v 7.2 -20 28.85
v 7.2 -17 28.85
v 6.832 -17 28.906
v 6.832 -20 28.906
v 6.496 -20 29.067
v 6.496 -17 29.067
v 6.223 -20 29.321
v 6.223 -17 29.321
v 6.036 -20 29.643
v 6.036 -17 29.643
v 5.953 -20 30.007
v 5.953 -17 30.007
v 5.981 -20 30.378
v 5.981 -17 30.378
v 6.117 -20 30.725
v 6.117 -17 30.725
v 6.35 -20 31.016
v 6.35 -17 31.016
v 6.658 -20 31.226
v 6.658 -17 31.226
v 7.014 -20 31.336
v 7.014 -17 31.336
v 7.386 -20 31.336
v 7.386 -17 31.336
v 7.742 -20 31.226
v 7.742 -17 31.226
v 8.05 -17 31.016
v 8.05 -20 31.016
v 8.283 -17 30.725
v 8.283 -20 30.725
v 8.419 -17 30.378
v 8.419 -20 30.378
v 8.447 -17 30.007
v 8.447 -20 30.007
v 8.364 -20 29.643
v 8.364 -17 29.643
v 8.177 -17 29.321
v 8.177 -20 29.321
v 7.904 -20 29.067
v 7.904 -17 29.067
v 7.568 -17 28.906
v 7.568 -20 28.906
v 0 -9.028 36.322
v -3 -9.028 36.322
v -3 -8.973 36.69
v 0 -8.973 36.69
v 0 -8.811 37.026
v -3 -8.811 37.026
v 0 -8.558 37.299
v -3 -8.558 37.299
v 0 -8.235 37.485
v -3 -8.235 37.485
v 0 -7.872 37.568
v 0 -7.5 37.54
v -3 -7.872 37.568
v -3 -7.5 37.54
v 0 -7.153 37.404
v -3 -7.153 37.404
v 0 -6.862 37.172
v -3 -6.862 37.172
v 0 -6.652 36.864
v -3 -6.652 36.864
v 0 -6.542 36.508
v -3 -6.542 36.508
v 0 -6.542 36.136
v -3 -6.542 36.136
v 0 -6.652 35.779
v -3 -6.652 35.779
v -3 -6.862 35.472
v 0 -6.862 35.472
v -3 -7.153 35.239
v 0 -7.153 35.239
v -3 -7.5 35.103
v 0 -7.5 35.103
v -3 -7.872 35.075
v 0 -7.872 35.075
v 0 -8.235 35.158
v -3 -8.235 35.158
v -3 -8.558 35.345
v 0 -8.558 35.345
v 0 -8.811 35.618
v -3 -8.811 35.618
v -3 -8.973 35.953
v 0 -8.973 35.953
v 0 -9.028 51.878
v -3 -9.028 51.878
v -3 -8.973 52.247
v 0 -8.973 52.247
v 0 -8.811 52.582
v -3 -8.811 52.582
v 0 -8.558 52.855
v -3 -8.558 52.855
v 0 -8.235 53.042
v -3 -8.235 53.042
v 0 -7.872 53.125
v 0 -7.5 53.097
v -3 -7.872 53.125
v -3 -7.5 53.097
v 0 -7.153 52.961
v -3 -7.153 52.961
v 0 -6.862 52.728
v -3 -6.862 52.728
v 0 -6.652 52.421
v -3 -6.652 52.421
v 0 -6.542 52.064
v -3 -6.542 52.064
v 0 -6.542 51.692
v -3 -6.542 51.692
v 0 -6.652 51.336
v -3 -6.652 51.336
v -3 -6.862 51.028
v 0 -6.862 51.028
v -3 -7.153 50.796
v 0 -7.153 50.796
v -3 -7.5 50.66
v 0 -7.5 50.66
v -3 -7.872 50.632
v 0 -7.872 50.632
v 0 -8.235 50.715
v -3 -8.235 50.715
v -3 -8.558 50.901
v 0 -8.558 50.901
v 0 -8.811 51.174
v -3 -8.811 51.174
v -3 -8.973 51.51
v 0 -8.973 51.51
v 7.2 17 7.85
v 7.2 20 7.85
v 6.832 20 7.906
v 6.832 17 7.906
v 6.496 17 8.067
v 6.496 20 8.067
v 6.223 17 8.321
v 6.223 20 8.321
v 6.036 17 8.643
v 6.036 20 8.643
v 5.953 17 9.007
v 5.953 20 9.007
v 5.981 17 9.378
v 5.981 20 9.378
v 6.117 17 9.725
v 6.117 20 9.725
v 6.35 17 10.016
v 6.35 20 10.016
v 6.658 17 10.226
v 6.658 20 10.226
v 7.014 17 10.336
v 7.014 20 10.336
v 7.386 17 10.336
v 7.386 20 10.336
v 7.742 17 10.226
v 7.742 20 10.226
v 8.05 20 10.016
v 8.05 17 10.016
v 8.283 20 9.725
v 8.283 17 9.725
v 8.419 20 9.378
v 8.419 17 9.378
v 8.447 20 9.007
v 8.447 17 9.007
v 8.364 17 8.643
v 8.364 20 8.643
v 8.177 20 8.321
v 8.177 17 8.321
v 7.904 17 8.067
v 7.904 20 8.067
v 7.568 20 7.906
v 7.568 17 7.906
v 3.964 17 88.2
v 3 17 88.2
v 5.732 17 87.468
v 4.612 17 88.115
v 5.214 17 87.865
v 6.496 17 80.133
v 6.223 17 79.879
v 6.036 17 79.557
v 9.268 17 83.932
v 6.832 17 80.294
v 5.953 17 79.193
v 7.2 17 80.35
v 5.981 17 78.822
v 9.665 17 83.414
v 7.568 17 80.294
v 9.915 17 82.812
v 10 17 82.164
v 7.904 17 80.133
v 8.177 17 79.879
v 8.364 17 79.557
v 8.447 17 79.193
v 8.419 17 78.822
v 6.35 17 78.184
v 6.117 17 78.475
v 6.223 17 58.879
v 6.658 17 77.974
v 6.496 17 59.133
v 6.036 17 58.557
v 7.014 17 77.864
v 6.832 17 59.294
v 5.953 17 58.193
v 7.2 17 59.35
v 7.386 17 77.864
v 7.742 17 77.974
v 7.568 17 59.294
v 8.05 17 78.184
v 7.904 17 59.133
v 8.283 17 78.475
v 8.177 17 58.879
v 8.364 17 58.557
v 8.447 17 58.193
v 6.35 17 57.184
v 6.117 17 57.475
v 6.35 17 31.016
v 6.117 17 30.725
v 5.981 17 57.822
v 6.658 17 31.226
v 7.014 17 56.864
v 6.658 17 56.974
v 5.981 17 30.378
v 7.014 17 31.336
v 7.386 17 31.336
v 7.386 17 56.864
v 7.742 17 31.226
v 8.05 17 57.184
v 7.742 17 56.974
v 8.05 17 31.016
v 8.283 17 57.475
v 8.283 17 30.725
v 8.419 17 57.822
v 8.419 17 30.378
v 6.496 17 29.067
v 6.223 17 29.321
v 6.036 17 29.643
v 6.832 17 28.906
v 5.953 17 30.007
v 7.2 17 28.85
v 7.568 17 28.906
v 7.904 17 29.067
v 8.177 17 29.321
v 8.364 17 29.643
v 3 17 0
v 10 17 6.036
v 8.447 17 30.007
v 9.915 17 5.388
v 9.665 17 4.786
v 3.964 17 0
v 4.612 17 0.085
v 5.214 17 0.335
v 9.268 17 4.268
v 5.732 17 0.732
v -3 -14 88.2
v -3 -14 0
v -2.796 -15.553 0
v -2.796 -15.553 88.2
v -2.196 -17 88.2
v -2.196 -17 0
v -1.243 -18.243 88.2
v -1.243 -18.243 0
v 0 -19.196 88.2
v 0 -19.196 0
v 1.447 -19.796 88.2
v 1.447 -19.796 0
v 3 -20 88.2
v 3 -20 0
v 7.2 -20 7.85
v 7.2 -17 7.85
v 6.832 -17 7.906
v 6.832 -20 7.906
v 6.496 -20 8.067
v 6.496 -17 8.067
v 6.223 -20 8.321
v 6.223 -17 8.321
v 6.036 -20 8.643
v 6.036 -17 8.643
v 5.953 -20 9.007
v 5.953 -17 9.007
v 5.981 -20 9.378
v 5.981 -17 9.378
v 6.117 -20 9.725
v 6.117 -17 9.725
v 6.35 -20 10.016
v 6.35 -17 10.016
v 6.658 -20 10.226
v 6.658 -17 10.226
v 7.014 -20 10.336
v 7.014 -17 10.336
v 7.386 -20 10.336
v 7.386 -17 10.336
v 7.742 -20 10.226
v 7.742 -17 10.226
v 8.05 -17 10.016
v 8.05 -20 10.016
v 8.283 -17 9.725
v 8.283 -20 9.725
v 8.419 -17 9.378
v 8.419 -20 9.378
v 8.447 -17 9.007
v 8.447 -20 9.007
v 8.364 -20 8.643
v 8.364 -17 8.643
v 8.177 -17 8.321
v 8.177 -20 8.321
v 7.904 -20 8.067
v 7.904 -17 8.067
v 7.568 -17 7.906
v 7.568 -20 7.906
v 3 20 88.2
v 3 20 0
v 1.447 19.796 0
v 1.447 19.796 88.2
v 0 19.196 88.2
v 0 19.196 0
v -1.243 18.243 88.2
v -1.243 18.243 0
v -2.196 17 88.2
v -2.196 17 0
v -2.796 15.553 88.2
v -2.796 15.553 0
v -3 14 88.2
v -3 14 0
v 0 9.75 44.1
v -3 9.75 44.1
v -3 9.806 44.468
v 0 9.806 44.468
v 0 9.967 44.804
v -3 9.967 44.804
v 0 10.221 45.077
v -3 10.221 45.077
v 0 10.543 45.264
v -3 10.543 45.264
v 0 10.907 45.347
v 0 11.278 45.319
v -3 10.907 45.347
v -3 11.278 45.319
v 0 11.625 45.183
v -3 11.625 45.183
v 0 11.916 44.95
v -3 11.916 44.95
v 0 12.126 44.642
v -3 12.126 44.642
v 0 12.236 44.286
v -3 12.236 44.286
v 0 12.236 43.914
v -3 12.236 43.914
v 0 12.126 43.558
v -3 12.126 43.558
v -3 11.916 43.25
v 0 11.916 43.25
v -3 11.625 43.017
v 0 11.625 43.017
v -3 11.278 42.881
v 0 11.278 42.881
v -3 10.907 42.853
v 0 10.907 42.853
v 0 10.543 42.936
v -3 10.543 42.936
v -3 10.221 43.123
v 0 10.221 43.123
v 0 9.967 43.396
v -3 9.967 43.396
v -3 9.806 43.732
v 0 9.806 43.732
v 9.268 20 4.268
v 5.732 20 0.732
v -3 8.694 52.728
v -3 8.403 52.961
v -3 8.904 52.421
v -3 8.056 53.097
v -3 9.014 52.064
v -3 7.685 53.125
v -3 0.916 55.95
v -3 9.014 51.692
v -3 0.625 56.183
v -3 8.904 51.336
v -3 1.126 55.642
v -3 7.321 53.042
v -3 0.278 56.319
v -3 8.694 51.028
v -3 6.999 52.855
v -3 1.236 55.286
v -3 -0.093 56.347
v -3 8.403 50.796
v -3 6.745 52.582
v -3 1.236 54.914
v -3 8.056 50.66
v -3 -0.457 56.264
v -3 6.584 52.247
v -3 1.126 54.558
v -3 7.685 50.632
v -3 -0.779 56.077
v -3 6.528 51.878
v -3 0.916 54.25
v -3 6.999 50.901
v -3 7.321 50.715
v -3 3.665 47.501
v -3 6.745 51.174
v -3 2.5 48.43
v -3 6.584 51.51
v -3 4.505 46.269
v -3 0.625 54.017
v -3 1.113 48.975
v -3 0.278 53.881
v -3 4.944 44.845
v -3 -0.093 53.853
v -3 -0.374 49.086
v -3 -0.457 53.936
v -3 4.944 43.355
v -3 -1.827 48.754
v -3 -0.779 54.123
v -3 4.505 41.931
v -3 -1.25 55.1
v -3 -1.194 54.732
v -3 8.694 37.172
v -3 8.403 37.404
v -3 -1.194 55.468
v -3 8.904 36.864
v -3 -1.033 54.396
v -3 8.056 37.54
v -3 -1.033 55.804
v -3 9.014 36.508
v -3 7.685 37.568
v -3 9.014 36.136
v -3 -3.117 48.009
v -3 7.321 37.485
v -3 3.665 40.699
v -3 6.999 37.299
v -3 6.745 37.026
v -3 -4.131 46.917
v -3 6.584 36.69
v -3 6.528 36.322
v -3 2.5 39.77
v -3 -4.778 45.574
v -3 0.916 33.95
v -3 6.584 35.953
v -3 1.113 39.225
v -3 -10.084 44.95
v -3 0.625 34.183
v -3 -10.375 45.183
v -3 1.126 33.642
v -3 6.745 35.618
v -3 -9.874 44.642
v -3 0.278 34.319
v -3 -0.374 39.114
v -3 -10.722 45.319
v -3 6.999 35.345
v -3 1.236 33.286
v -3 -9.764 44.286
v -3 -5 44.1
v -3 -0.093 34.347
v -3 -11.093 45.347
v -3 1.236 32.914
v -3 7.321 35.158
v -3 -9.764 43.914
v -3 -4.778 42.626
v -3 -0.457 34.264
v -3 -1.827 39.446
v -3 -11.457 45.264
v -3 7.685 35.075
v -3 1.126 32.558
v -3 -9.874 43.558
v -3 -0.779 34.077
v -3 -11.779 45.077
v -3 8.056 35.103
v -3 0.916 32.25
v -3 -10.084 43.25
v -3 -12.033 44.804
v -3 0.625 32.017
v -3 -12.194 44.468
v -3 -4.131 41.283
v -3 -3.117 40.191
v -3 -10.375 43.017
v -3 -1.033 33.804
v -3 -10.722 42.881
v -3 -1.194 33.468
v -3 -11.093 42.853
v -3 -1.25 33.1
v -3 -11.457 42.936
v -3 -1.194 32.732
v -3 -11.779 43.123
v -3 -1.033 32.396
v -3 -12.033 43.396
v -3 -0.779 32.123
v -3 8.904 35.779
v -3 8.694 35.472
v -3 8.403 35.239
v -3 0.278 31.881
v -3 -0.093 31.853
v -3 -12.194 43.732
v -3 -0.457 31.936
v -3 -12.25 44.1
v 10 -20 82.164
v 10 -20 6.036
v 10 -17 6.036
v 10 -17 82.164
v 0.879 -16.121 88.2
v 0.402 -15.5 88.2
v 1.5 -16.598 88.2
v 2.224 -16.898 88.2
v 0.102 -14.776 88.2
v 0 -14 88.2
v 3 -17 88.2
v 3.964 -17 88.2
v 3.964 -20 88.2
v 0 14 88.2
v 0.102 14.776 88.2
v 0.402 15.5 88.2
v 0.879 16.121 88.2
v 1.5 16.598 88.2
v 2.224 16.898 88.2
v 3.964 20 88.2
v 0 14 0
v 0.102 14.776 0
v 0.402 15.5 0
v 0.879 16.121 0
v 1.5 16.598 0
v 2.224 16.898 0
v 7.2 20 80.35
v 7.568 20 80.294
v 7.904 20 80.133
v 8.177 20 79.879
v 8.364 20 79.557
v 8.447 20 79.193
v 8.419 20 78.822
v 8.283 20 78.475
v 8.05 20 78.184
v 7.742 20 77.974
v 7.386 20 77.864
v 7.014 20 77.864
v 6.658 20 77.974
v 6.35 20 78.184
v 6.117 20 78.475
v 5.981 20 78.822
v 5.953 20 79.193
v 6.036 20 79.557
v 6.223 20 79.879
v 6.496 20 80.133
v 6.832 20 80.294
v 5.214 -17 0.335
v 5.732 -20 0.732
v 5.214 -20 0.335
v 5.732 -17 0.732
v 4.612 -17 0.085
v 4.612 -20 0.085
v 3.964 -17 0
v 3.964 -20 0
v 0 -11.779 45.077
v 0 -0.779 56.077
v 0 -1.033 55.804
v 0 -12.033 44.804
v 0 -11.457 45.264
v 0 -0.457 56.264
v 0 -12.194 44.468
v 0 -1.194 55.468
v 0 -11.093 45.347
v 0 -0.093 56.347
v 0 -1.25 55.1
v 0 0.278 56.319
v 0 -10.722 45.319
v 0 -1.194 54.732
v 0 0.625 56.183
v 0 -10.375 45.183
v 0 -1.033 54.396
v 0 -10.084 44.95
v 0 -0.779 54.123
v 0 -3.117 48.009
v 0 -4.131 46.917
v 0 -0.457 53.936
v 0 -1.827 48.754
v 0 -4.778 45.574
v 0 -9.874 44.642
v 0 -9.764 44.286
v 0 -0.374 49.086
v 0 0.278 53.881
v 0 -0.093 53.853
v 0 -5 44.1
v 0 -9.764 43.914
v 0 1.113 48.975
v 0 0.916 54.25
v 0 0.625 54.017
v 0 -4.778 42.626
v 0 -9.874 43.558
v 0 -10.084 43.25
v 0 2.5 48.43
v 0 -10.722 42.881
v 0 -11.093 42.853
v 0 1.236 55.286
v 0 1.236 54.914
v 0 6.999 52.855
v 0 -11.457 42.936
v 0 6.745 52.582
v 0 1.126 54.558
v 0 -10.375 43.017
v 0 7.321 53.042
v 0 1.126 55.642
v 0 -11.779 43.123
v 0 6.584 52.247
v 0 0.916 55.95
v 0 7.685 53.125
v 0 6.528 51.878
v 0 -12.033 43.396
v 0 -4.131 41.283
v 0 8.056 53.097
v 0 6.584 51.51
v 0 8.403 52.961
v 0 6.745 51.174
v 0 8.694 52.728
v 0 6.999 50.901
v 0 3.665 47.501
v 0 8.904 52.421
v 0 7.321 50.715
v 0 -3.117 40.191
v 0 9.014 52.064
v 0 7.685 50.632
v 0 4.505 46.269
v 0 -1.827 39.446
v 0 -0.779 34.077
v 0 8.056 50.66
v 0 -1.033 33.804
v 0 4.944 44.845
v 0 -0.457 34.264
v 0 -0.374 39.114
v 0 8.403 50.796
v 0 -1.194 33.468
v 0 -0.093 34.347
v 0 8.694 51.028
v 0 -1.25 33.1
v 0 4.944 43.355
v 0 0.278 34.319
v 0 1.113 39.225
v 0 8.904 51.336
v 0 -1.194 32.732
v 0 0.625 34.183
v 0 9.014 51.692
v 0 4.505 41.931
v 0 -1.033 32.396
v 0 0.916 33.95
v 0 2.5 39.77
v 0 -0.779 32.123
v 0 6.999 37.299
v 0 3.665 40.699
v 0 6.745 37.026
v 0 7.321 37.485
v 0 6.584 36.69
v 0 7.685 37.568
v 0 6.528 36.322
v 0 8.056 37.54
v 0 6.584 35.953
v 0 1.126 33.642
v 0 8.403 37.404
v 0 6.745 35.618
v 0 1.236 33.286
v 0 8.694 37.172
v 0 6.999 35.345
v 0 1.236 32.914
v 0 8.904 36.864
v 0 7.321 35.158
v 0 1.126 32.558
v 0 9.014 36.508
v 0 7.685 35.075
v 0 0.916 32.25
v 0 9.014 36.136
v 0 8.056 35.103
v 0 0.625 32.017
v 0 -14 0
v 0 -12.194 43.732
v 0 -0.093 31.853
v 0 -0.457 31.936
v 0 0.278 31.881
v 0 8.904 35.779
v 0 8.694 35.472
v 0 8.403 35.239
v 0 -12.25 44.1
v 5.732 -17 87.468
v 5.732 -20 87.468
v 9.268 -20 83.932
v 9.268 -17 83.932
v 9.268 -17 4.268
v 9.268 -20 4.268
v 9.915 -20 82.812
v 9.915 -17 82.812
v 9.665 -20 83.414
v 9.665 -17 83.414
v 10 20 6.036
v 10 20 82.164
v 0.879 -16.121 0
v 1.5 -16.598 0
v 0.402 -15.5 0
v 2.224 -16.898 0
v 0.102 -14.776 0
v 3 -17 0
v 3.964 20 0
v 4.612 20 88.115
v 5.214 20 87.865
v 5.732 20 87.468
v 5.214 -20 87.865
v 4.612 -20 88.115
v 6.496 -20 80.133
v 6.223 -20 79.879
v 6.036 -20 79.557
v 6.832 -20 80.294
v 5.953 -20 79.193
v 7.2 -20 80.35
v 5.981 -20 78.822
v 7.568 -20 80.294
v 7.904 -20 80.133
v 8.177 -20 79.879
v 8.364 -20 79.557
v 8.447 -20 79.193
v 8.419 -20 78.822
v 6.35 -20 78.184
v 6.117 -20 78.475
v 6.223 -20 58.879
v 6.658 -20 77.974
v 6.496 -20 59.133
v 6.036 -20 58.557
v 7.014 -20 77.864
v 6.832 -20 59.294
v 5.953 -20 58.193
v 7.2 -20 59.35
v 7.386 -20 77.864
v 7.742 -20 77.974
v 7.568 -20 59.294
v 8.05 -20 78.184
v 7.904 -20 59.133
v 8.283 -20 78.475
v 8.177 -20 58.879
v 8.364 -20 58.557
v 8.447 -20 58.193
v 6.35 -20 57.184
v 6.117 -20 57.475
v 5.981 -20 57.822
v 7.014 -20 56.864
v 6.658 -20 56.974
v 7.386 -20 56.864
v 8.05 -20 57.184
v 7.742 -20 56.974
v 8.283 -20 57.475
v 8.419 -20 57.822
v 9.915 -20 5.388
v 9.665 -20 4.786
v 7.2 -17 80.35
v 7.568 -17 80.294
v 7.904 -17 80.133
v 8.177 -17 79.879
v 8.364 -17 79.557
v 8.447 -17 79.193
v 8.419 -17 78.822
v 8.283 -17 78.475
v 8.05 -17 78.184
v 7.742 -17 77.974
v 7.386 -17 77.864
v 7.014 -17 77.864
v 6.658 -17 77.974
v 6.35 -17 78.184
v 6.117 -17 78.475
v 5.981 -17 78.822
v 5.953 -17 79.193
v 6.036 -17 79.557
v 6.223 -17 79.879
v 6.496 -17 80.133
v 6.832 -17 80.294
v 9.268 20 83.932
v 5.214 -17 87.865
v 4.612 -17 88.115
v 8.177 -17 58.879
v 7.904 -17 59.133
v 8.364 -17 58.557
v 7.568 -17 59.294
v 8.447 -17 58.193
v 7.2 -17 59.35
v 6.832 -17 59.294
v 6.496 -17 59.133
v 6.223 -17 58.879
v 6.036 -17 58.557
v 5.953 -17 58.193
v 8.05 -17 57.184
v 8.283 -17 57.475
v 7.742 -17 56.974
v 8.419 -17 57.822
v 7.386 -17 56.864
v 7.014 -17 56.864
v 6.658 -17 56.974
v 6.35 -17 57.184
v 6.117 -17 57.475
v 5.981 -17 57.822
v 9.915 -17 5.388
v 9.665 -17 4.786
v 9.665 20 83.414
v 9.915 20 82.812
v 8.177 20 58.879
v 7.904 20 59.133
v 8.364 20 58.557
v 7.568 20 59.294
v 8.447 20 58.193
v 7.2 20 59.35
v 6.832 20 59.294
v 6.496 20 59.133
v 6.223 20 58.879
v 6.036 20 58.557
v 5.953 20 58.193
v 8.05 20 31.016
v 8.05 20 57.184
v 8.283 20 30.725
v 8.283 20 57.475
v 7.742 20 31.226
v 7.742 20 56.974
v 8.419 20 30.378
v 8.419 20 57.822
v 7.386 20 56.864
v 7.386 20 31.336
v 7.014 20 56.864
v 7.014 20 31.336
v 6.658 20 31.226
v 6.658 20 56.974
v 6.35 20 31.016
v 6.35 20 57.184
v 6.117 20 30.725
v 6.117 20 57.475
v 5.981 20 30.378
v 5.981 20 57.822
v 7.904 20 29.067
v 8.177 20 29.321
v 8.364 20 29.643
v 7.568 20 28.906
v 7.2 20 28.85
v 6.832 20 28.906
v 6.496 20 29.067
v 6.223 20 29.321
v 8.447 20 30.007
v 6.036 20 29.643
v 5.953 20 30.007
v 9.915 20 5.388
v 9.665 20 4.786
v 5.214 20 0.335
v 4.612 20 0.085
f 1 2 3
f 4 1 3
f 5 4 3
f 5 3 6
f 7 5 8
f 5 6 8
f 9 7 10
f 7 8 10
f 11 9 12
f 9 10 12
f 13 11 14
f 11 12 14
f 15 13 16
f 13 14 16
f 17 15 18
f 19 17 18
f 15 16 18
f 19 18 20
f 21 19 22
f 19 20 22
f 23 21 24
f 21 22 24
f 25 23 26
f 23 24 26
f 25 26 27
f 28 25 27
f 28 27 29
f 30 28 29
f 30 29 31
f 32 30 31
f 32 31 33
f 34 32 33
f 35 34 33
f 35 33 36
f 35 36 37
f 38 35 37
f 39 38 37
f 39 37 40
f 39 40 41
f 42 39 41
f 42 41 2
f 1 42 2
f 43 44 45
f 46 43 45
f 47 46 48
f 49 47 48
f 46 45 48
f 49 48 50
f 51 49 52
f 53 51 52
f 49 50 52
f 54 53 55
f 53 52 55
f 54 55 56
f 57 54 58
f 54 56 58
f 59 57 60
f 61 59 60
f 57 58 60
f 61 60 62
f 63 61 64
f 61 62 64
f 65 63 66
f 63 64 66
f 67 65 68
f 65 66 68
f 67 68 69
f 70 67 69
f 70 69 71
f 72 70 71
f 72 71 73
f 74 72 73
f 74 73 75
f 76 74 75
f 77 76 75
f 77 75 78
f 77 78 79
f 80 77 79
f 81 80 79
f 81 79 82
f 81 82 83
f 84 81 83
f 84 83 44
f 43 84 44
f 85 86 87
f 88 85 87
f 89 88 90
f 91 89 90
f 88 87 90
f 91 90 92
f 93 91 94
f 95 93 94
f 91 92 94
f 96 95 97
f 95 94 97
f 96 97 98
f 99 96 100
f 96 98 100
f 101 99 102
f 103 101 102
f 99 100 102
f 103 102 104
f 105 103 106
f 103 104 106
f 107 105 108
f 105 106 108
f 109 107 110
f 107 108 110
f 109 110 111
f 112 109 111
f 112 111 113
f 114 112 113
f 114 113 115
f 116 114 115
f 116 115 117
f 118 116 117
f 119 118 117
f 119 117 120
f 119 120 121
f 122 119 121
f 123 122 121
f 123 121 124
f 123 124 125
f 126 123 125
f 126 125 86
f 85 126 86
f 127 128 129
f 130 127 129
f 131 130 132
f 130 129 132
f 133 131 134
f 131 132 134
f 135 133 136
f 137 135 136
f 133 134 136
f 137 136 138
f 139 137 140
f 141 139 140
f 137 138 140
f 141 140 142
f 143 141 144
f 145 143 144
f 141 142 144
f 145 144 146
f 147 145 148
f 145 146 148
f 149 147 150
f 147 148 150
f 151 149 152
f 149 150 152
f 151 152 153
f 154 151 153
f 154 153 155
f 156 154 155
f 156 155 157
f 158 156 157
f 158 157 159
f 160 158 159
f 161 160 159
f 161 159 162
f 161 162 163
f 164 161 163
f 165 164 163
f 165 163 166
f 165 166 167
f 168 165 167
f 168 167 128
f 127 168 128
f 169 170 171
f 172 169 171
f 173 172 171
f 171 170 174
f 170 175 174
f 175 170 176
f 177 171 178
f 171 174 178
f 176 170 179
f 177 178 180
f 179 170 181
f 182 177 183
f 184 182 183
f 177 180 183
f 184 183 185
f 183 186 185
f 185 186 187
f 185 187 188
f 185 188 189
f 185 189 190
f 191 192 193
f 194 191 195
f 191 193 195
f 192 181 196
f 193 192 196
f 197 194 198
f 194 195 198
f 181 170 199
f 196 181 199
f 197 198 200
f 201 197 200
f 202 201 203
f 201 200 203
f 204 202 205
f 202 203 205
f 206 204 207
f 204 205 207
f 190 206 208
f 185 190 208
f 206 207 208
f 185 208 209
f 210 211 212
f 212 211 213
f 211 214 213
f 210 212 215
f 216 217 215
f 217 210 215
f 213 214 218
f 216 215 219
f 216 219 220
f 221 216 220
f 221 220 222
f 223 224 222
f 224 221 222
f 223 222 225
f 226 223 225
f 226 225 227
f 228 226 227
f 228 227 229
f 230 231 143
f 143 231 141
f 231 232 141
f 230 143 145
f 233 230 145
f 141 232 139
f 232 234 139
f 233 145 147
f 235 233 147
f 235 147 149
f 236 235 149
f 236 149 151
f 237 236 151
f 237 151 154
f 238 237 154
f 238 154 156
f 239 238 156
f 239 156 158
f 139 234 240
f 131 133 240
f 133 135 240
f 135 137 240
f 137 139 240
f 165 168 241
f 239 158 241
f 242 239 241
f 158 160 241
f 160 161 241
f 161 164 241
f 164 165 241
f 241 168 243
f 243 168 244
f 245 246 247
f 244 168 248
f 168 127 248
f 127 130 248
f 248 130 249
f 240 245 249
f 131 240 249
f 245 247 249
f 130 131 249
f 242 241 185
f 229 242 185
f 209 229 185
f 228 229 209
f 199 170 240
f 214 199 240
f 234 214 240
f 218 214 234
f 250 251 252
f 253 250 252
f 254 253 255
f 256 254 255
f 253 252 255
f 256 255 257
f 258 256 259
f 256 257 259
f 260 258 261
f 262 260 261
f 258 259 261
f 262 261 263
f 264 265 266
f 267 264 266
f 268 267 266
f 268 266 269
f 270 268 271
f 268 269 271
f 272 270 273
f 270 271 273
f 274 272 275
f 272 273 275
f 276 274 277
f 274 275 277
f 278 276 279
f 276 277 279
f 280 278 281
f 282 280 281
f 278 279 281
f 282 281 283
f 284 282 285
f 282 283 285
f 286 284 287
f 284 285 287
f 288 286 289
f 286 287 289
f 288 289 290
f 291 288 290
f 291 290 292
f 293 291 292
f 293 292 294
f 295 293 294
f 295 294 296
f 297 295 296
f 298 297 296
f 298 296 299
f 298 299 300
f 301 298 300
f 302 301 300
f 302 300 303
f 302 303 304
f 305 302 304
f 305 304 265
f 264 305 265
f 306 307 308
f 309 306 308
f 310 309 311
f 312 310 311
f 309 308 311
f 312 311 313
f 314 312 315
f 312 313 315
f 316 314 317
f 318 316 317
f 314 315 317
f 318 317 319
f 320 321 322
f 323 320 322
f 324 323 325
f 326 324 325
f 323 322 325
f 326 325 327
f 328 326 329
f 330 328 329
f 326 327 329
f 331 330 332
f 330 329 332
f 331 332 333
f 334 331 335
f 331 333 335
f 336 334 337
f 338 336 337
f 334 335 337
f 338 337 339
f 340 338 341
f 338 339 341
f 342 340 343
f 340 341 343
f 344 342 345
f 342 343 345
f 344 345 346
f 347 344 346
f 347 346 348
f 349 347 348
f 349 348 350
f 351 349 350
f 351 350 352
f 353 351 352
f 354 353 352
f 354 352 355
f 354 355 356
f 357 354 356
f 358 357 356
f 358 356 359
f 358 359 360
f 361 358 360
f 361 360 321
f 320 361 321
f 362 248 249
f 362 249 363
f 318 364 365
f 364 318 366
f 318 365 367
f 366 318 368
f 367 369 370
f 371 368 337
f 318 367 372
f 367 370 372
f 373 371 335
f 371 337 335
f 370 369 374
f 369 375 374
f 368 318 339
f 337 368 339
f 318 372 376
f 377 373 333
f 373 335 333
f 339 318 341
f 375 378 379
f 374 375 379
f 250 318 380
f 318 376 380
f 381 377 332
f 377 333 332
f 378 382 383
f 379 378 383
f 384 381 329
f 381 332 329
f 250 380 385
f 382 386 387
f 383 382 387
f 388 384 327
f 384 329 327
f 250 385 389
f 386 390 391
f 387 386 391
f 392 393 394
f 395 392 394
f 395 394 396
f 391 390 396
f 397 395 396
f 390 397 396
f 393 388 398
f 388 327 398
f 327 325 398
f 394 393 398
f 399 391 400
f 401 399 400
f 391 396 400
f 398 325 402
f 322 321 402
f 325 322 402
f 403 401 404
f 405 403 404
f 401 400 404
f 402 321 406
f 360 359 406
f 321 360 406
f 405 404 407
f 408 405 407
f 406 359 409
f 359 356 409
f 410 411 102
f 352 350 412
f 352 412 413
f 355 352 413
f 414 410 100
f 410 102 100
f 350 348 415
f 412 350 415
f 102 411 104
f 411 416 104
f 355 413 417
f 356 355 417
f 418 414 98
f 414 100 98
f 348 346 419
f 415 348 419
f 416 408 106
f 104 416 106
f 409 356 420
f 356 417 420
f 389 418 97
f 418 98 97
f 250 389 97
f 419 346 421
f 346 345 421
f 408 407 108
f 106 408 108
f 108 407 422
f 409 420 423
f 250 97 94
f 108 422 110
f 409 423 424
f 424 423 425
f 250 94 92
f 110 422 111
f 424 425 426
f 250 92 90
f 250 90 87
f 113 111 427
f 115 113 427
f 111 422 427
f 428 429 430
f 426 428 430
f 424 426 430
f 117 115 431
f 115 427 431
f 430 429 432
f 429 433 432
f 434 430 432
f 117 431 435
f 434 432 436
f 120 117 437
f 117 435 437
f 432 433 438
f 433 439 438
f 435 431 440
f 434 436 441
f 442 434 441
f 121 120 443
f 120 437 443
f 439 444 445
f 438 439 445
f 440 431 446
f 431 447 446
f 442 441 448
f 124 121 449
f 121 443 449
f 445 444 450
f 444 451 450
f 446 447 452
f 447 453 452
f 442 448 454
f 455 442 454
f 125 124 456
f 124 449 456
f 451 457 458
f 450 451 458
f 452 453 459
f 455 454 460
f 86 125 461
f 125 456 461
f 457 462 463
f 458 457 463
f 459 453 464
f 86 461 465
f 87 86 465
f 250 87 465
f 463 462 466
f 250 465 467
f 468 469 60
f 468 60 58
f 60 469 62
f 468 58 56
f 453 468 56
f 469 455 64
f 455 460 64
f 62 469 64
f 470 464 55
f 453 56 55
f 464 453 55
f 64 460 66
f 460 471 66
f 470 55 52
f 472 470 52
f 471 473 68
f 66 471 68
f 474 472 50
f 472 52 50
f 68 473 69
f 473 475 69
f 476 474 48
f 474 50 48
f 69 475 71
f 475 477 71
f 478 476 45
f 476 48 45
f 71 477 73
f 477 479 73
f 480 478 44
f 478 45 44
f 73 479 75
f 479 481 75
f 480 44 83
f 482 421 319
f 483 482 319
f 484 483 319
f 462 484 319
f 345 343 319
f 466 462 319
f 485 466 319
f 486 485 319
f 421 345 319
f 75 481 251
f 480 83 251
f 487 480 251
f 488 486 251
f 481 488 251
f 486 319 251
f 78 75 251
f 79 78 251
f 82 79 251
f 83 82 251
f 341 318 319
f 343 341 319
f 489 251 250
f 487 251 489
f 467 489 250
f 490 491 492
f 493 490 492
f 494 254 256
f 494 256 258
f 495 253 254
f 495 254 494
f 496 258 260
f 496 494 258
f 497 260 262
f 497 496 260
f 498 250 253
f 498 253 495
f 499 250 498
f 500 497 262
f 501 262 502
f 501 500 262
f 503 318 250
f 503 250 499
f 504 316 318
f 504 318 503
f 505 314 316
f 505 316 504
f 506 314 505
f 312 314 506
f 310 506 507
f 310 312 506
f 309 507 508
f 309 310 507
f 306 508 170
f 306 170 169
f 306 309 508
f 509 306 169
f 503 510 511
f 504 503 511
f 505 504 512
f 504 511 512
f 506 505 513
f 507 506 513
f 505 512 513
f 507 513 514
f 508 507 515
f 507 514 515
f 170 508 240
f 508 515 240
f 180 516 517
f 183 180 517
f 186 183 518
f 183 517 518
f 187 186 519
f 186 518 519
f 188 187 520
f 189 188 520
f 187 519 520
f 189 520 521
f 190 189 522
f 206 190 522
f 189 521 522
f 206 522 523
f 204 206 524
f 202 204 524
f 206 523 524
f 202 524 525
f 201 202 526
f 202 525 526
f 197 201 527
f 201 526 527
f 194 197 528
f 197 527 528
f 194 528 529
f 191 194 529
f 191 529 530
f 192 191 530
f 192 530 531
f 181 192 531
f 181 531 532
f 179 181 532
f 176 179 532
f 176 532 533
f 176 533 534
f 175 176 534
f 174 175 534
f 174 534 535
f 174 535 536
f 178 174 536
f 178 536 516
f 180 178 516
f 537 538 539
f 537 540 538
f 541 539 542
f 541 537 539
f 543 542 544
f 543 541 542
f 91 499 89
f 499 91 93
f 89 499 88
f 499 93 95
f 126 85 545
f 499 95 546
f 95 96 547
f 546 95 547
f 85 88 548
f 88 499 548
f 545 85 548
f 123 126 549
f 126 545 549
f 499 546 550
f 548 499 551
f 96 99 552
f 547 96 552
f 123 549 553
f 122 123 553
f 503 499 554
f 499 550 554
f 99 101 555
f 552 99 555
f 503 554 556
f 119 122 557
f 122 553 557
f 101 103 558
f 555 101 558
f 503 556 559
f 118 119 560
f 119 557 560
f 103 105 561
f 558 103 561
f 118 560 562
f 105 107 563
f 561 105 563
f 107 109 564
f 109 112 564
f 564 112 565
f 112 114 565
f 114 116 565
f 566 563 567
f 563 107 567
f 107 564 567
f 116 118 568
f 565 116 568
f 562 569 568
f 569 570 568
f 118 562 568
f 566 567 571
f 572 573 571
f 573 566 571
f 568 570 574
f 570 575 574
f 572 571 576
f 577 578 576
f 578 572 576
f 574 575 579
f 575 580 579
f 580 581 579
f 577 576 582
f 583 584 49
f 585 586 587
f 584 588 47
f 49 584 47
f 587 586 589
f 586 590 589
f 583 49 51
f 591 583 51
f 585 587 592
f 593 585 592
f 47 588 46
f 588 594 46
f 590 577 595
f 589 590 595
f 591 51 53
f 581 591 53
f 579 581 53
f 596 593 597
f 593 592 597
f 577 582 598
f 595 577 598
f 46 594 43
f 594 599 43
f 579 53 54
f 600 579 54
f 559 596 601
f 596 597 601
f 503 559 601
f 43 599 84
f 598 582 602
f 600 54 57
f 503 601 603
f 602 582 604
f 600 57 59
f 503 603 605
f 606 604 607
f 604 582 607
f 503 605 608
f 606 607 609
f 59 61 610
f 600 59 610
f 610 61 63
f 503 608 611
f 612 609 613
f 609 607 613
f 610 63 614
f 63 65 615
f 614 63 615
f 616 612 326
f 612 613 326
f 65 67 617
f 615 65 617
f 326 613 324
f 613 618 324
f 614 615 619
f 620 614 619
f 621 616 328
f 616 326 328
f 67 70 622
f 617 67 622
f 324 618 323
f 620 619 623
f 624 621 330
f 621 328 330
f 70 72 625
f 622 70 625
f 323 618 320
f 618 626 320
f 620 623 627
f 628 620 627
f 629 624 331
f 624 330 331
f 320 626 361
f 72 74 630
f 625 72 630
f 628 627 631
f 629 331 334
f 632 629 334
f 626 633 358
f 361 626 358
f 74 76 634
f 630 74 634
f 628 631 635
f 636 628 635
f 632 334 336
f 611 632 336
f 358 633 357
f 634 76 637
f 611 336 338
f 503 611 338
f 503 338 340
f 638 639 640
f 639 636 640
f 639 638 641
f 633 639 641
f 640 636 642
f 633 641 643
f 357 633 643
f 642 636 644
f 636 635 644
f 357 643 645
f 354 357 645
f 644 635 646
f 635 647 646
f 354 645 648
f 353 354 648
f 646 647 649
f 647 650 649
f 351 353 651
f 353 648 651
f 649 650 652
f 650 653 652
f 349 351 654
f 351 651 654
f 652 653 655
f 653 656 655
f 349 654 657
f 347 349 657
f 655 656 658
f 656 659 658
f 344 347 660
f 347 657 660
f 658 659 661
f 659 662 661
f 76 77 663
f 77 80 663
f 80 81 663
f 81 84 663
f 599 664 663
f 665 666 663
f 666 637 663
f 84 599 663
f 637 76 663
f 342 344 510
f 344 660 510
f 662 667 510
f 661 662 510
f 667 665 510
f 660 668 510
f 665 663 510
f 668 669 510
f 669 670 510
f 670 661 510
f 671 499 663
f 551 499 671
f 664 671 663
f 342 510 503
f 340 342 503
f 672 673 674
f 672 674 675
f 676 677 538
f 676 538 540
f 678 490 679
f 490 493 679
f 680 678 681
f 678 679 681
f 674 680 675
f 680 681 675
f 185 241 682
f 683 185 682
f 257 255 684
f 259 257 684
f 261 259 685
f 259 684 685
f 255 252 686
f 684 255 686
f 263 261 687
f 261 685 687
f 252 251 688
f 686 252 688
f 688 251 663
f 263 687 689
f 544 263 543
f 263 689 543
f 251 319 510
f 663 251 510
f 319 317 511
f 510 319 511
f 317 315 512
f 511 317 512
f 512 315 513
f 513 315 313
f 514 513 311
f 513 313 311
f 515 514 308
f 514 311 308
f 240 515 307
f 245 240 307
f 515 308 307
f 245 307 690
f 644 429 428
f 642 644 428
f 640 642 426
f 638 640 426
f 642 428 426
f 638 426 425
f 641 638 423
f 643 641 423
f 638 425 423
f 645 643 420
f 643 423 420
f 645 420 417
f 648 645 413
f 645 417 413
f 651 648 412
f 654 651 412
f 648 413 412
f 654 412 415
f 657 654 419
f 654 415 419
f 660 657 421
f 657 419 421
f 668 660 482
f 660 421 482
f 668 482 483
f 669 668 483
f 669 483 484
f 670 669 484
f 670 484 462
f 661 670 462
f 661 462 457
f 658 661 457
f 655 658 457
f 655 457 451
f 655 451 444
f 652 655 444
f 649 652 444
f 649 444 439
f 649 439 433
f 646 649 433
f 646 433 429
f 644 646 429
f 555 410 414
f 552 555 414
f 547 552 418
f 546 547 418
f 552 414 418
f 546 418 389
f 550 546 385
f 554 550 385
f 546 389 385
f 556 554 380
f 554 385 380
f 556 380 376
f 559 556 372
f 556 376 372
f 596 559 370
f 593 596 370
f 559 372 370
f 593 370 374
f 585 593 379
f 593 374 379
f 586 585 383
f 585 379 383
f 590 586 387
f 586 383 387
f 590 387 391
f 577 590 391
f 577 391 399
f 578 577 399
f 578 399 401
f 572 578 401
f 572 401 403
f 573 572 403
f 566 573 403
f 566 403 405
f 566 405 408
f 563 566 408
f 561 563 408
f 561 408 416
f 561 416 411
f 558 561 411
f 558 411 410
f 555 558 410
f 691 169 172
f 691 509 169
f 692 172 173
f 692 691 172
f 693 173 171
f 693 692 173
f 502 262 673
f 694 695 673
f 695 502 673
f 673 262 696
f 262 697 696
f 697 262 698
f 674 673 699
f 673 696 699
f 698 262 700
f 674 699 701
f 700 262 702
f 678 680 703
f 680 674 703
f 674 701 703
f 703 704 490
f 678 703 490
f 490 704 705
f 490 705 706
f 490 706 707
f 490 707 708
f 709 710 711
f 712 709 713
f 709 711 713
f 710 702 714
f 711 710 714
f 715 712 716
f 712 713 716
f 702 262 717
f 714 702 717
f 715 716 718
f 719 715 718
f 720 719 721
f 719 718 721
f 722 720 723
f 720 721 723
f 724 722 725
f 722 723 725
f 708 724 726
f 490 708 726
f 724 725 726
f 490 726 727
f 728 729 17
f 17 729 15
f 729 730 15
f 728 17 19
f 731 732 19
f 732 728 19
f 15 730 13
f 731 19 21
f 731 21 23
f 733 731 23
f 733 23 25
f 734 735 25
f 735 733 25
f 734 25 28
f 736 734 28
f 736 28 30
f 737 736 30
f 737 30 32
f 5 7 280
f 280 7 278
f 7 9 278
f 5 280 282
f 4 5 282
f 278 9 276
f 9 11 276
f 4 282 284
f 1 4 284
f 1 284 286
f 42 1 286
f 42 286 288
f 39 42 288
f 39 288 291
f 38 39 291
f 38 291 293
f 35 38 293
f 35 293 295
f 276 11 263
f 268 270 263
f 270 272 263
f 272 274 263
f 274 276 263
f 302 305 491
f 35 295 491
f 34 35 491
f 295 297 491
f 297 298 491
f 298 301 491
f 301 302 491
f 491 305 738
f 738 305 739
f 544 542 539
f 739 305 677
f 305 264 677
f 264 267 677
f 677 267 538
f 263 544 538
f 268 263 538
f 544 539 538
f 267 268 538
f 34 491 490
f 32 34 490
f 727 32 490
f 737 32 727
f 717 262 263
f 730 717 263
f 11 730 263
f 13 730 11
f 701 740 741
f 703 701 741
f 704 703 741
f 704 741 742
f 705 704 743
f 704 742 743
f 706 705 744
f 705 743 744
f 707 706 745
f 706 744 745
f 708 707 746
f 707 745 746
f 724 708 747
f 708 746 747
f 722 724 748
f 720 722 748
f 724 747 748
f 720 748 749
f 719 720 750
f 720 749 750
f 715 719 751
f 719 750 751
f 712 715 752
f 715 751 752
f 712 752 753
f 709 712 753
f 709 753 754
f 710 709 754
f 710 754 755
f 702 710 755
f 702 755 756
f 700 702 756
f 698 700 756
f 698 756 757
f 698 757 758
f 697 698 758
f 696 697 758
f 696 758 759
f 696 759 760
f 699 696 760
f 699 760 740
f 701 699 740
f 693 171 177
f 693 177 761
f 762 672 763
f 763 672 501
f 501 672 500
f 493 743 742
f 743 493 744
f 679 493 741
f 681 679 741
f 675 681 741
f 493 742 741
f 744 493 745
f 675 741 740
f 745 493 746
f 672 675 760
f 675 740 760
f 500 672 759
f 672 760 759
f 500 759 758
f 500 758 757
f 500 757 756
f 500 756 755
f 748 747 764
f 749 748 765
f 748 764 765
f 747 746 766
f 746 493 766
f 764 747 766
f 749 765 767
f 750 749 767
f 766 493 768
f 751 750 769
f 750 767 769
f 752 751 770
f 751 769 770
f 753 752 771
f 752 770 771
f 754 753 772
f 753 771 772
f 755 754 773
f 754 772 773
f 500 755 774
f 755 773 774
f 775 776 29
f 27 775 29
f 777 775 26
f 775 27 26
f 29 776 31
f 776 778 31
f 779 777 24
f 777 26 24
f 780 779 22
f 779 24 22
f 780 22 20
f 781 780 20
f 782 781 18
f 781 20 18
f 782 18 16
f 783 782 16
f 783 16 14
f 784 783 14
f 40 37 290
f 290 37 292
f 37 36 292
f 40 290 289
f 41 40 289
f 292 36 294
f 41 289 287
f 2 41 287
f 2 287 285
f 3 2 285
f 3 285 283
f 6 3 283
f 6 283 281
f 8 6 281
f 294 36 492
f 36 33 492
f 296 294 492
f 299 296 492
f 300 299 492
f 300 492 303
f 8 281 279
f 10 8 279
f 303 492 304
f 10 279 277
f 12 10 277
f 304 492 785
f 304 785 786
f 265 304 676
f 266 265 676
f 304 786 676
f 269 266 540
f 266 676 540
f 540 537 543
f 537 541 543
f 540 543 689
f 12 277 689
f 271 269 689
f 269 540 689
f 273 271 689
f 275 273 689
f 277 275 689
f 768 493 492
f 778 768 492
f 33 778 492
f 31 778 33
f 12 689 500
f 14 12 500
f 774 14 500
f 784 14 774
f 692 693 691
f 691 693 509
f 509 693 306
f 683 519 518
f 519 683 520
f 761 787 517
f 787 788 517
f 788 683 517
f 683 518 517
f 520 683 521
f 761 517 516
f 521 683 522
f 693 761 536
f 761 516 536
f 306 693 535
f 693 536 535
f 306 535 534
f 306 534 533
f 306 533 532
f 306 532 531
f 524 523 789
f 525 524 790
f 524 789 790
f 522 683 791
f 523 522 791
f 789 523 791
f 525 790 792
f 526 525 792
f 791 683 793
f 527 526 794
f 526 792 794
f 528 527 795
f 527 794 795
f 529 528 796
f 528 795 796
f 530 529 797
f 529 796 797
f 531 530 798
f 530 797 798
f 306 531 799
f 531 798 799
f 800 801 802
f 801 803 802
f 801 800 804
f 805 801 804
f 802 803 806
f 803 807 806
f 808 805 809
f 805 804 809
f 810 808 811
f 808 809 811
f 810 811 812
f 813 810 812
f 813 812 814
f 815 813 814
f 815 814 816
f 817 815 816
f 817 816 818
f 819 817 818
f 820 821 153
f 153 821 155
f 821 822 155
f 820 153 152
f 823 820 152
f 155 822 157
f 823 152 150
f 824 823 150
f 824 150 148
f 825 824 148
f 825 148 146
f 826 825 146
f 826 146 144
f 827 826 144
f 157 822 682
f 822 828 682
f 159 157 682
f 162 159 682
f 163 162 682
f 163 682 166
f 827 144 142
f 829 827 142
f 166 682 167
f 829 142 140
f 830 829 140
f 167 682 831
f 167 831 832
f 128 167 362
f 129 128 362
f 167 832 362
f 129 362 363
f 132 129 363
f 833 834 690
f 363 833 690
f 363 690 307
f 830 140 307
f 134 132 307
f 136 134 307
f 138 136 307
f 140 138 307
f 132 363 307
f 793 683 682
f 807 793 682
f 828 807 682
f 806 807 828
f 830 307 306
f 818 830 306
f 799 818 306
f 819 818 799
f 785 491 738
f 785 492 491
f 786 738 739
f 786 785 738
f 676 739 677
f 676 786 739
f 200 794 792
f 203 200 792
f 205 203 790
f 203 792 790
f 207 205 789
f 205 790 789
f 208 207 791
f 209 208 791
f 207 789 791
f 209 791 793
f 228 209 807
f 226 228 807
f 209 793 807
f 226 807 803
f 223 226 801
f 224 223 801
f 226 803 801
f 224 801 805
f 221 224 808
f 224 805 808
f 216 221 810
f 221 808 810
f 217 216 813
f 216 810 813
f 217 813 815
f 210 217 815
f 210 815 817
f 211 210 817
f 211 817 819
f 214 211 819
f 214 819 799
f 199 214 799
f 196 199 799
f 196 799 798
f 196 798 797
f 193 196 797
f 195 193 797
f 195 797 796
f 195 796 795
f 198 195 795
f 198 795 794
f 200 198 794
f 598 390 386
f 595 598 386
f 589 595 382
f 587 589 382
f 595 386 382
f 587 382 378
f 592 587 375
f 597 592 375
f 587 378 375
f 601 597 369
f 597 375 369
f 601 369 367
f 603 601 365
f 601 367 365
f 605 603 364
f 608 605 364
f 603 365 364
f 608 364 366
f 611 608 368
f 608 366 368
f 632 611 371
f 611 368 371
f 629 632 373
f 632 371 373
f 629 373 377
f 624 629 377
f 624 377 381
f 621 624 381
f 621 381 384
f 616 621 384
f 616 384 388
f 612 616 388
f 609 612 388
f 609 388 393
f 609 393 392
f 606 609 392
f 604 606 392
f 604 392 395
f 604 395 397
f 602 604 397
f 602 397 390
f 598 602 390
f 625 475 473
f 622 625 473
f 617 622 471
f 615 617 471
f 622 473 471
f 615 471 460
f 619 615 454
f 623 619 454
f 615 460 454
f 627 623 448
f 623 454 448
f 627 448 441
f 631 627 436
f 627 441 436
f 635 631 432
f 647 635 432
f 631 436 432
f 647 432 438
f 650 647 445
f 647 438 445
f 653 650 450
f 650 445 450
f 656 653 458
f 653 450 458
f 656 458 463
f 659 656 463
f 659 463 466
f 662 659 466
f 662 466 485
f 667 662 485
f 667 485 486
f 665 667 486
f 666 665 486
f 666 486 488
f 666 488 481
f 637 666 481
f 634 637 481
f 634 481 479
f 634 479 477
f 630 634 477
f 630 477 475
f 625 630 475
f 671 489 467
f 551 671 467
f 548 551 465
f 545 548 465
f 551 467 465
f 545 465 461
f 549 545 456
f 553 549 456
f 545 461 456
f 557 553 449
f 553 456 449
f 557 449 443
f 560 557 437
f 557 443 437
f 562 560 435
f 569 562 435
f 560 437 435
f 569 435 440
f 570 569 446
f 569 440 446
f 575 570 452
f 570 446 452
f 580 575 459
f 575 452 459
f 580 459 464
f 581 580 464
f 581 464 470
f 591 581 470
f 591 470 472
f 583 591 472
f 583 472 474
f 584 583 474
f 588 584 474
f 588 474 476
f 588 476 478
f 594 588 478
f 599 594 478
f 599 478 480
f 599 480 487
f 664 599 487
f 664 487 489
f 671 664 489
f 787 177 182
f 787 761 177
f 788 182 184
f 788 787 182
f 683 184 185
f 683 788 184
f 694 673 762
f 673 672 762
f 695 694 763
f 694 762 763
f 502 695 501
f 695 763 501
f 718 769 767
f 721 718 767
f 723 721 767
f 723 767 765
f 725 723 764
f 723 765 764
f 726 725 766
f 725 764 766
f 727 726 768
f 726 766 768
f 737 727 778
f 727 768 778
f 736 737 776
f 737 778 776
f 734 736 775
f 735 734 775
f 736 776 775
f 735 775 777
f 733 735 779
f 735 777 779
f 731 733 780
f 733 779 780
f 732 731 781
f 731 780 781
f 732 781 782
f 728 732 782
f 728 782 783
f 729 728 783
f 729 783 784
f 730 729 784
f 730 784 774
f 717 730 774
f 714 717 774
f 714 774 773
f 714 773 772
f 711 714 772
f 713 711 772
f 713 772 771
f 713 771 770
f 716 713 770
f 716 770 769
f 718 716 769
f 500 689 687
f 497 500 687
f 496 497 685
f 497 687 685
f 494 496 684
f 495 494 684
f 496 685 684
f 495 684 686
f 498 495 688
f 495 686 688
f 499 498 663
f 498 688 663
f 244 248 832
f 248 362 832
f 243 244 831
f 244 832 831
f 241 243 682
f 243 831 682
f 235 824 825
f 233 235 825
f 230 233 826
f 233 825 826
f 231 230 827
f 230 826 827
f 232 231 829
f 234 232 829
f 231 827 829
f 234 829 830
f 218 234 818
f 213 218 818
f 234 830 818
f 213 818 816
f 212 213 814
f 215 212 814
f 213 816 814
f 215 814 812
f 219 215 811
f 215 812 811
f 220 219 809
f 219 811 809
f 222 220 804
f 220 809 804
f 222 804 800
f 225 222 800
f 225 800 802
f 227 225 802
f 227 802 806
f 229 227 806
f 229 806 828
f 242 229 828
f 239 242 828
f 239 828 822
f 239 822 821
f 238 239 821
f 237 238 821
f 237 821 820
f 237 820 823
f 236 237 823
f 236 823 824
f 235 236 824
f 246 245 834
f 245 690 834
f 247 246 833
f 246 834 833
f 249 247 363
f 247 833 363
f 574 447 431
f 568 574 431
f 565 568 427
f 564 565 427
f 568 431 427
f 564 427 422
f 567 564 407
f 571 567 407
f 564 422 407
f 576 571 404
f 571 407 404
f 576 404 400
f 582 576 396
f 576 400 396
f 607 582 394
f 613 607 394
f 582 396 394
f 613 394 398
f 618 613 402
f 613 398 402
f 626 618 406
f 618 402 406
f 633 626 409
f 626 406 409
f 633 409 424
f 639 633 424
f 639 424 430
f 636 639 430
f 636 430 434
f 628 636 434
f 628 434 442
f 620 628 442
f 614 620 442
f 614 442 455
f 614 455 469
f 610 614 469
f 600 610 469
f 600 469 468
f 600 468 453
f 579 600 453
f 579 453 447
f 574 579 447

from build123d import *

# Parameters (mm, degrees)
BASE_FLANGE1_DEPTH = 88.2
CHAMFER1_SIZE      = 5
FILLET1_R          = 2.5
SKETCH4_R          = 5
CUT_EXTRUDE1_DEPTH = 92.368703613
SKETCH5_R          = 1.25
CUT_EXTRUDE2_DEPTH = 92.368703613
SKETCH6_R          = 1.25
CUT_EXTRUDE3_DEPTH = 98.361388651


# Sheet-metal steps are written as plain solids
with BuildPart() as part:
    # Sketch1 → Base-Flange1 (new body)
    with BuildSketch(Plane.XY):
        with BuildLine():
            Line((10, -17), (3, -17))
            ThreePointArc((3, -17), (0.878679656, -16.121320344), (0, -14))
            Line((0, -14), (0, 0))
            Line((0, 0), (0, 14))
            ThreePointArc((0, 14), (0.878679656, 16.121320344), (3, 17))
            Line((3, 17), (10, 17))
            Line((10, 17), (10, 20))
            Line((10, 20), (3, 20))
            ThreePointArc((3, 20), (-1.242640687, 18.242640687), (-3, 14))
            Line((-3, 14), (-3, 0))
            Line((-3, 0), (-3, -14))
            ThreePointArc((-3, -14), (-1.242640687, -18.242640687), (3, -20))
            Line((3, -20), (10, -20))
            Line((10, -20), (10, -17))
        make_face()
    extrude(amount=BASE_FLANGE1_DEPTH)

    # Chamfer1
    chamfer1_edges = [part.edges().sort_by_distance(p)[0] for p in [
        (10, 18.5, 0),
        (10, -18.5, 0),
        (10, 18.5, 88.2),
        (10, -18.5, 88.2),
    ]]
    chamfer(chamfer1_edges, length=CHAMFER1_SIZE)

    # Fillet1
    fillet1_edges = [part.edges().sort_by_distance(p)[0] for p in [
        (5, -18.5, 0),
        (10, -18.5, 83.2),
        (10, -18.5, 5),
        (5, 18.5, 0),
        (10, 18.5, 83.2),
        (10, 18.5, 5),
        (5, -18.5, 88.2),
        (5, 18.5, 88.2),
    ]]
    fillet(fillet1_edges, radius=FILLET1_R)

    # Sketch4 → Cut-Extrude1 (cut, through all)
    with BuildSketch(Plane.ZY.offset(3)):
        with Locations(Location((44.1, 0, 0), (0, 0, 270))):
            Circle(SKETCH4_R)
    extrude(amount=-CUT_EXTRUDE1_DEPTH, mode=Mode.SUBTRACT)

    # Sketch5 → Cut-Extrude2 (cut, through all)
    with BuildSketch(Plane.ZY.offset(3)):
        with Locations(Location((44.1, 11, 0), (0, 0, 270))):
            Circle(SKETCH5_R)
        with Locations(Location((51.878174593, 7.778174593, 0), (0, 0, 270))):
            Circle(SKETCH5_R)
        with Locations(Location((55.1, 0, 0), (0, 0, 270))):
            Circle(SKETCH5_R)
        with Locations(Location((51.878174593, -7.778174593, 0), (0, 0, 270))):
            Circle(SKETCH5_R)
        with Locations(Location((44.1, -11, 0), (0, 0, 270))):
            Circle(SKETCH5_R)
        with Locations(Location((36.321825407, -7.778174593, 0), (0, 0, 270))):
            Circle(SKETCH5_R)
        with Locations(Location((33.1, 0, 0), (0, 0, 270))):
            Circle(SKETCH5_R)
        with Locations(Location((36.321825407, 7.778174593, 0), (0, 0, 270))):
            Circle(SKETCH5_R)
    extrude(amount=-CUT_EXTRUDE2_DEPTH, mode=Mode.SUBTRACT)

    # Sketch6 → Cut-Extrude3 (cut, through all)
    with BuildSketch(Plane(origin=(0, 20, 0), x_dir=(1, 0, 0), z_dir=(0, 1, 0))):
        with Locations(Location((7.2, -79.1, 0), (0, 0, 270))):
            Circle(SKETCH6_R)
        with Locations(Location((7.2, -58.1, 0), (0, 0, 270))):
            Circle(SKETCH6_R)
        with Locations(Location((7.2, -30.1, 0), (0, 0, 90))):
            Circle(SKETCH6_R)
        with Locations(Location((7.2, -9.1, 0), (0, 0, 90))):
            Circle(SKETCH6_R)
    extrude(amount=-CUT_EXTRUDE3_DEPTH, mode=Mode.SUBTRACT)


solid = part.part
